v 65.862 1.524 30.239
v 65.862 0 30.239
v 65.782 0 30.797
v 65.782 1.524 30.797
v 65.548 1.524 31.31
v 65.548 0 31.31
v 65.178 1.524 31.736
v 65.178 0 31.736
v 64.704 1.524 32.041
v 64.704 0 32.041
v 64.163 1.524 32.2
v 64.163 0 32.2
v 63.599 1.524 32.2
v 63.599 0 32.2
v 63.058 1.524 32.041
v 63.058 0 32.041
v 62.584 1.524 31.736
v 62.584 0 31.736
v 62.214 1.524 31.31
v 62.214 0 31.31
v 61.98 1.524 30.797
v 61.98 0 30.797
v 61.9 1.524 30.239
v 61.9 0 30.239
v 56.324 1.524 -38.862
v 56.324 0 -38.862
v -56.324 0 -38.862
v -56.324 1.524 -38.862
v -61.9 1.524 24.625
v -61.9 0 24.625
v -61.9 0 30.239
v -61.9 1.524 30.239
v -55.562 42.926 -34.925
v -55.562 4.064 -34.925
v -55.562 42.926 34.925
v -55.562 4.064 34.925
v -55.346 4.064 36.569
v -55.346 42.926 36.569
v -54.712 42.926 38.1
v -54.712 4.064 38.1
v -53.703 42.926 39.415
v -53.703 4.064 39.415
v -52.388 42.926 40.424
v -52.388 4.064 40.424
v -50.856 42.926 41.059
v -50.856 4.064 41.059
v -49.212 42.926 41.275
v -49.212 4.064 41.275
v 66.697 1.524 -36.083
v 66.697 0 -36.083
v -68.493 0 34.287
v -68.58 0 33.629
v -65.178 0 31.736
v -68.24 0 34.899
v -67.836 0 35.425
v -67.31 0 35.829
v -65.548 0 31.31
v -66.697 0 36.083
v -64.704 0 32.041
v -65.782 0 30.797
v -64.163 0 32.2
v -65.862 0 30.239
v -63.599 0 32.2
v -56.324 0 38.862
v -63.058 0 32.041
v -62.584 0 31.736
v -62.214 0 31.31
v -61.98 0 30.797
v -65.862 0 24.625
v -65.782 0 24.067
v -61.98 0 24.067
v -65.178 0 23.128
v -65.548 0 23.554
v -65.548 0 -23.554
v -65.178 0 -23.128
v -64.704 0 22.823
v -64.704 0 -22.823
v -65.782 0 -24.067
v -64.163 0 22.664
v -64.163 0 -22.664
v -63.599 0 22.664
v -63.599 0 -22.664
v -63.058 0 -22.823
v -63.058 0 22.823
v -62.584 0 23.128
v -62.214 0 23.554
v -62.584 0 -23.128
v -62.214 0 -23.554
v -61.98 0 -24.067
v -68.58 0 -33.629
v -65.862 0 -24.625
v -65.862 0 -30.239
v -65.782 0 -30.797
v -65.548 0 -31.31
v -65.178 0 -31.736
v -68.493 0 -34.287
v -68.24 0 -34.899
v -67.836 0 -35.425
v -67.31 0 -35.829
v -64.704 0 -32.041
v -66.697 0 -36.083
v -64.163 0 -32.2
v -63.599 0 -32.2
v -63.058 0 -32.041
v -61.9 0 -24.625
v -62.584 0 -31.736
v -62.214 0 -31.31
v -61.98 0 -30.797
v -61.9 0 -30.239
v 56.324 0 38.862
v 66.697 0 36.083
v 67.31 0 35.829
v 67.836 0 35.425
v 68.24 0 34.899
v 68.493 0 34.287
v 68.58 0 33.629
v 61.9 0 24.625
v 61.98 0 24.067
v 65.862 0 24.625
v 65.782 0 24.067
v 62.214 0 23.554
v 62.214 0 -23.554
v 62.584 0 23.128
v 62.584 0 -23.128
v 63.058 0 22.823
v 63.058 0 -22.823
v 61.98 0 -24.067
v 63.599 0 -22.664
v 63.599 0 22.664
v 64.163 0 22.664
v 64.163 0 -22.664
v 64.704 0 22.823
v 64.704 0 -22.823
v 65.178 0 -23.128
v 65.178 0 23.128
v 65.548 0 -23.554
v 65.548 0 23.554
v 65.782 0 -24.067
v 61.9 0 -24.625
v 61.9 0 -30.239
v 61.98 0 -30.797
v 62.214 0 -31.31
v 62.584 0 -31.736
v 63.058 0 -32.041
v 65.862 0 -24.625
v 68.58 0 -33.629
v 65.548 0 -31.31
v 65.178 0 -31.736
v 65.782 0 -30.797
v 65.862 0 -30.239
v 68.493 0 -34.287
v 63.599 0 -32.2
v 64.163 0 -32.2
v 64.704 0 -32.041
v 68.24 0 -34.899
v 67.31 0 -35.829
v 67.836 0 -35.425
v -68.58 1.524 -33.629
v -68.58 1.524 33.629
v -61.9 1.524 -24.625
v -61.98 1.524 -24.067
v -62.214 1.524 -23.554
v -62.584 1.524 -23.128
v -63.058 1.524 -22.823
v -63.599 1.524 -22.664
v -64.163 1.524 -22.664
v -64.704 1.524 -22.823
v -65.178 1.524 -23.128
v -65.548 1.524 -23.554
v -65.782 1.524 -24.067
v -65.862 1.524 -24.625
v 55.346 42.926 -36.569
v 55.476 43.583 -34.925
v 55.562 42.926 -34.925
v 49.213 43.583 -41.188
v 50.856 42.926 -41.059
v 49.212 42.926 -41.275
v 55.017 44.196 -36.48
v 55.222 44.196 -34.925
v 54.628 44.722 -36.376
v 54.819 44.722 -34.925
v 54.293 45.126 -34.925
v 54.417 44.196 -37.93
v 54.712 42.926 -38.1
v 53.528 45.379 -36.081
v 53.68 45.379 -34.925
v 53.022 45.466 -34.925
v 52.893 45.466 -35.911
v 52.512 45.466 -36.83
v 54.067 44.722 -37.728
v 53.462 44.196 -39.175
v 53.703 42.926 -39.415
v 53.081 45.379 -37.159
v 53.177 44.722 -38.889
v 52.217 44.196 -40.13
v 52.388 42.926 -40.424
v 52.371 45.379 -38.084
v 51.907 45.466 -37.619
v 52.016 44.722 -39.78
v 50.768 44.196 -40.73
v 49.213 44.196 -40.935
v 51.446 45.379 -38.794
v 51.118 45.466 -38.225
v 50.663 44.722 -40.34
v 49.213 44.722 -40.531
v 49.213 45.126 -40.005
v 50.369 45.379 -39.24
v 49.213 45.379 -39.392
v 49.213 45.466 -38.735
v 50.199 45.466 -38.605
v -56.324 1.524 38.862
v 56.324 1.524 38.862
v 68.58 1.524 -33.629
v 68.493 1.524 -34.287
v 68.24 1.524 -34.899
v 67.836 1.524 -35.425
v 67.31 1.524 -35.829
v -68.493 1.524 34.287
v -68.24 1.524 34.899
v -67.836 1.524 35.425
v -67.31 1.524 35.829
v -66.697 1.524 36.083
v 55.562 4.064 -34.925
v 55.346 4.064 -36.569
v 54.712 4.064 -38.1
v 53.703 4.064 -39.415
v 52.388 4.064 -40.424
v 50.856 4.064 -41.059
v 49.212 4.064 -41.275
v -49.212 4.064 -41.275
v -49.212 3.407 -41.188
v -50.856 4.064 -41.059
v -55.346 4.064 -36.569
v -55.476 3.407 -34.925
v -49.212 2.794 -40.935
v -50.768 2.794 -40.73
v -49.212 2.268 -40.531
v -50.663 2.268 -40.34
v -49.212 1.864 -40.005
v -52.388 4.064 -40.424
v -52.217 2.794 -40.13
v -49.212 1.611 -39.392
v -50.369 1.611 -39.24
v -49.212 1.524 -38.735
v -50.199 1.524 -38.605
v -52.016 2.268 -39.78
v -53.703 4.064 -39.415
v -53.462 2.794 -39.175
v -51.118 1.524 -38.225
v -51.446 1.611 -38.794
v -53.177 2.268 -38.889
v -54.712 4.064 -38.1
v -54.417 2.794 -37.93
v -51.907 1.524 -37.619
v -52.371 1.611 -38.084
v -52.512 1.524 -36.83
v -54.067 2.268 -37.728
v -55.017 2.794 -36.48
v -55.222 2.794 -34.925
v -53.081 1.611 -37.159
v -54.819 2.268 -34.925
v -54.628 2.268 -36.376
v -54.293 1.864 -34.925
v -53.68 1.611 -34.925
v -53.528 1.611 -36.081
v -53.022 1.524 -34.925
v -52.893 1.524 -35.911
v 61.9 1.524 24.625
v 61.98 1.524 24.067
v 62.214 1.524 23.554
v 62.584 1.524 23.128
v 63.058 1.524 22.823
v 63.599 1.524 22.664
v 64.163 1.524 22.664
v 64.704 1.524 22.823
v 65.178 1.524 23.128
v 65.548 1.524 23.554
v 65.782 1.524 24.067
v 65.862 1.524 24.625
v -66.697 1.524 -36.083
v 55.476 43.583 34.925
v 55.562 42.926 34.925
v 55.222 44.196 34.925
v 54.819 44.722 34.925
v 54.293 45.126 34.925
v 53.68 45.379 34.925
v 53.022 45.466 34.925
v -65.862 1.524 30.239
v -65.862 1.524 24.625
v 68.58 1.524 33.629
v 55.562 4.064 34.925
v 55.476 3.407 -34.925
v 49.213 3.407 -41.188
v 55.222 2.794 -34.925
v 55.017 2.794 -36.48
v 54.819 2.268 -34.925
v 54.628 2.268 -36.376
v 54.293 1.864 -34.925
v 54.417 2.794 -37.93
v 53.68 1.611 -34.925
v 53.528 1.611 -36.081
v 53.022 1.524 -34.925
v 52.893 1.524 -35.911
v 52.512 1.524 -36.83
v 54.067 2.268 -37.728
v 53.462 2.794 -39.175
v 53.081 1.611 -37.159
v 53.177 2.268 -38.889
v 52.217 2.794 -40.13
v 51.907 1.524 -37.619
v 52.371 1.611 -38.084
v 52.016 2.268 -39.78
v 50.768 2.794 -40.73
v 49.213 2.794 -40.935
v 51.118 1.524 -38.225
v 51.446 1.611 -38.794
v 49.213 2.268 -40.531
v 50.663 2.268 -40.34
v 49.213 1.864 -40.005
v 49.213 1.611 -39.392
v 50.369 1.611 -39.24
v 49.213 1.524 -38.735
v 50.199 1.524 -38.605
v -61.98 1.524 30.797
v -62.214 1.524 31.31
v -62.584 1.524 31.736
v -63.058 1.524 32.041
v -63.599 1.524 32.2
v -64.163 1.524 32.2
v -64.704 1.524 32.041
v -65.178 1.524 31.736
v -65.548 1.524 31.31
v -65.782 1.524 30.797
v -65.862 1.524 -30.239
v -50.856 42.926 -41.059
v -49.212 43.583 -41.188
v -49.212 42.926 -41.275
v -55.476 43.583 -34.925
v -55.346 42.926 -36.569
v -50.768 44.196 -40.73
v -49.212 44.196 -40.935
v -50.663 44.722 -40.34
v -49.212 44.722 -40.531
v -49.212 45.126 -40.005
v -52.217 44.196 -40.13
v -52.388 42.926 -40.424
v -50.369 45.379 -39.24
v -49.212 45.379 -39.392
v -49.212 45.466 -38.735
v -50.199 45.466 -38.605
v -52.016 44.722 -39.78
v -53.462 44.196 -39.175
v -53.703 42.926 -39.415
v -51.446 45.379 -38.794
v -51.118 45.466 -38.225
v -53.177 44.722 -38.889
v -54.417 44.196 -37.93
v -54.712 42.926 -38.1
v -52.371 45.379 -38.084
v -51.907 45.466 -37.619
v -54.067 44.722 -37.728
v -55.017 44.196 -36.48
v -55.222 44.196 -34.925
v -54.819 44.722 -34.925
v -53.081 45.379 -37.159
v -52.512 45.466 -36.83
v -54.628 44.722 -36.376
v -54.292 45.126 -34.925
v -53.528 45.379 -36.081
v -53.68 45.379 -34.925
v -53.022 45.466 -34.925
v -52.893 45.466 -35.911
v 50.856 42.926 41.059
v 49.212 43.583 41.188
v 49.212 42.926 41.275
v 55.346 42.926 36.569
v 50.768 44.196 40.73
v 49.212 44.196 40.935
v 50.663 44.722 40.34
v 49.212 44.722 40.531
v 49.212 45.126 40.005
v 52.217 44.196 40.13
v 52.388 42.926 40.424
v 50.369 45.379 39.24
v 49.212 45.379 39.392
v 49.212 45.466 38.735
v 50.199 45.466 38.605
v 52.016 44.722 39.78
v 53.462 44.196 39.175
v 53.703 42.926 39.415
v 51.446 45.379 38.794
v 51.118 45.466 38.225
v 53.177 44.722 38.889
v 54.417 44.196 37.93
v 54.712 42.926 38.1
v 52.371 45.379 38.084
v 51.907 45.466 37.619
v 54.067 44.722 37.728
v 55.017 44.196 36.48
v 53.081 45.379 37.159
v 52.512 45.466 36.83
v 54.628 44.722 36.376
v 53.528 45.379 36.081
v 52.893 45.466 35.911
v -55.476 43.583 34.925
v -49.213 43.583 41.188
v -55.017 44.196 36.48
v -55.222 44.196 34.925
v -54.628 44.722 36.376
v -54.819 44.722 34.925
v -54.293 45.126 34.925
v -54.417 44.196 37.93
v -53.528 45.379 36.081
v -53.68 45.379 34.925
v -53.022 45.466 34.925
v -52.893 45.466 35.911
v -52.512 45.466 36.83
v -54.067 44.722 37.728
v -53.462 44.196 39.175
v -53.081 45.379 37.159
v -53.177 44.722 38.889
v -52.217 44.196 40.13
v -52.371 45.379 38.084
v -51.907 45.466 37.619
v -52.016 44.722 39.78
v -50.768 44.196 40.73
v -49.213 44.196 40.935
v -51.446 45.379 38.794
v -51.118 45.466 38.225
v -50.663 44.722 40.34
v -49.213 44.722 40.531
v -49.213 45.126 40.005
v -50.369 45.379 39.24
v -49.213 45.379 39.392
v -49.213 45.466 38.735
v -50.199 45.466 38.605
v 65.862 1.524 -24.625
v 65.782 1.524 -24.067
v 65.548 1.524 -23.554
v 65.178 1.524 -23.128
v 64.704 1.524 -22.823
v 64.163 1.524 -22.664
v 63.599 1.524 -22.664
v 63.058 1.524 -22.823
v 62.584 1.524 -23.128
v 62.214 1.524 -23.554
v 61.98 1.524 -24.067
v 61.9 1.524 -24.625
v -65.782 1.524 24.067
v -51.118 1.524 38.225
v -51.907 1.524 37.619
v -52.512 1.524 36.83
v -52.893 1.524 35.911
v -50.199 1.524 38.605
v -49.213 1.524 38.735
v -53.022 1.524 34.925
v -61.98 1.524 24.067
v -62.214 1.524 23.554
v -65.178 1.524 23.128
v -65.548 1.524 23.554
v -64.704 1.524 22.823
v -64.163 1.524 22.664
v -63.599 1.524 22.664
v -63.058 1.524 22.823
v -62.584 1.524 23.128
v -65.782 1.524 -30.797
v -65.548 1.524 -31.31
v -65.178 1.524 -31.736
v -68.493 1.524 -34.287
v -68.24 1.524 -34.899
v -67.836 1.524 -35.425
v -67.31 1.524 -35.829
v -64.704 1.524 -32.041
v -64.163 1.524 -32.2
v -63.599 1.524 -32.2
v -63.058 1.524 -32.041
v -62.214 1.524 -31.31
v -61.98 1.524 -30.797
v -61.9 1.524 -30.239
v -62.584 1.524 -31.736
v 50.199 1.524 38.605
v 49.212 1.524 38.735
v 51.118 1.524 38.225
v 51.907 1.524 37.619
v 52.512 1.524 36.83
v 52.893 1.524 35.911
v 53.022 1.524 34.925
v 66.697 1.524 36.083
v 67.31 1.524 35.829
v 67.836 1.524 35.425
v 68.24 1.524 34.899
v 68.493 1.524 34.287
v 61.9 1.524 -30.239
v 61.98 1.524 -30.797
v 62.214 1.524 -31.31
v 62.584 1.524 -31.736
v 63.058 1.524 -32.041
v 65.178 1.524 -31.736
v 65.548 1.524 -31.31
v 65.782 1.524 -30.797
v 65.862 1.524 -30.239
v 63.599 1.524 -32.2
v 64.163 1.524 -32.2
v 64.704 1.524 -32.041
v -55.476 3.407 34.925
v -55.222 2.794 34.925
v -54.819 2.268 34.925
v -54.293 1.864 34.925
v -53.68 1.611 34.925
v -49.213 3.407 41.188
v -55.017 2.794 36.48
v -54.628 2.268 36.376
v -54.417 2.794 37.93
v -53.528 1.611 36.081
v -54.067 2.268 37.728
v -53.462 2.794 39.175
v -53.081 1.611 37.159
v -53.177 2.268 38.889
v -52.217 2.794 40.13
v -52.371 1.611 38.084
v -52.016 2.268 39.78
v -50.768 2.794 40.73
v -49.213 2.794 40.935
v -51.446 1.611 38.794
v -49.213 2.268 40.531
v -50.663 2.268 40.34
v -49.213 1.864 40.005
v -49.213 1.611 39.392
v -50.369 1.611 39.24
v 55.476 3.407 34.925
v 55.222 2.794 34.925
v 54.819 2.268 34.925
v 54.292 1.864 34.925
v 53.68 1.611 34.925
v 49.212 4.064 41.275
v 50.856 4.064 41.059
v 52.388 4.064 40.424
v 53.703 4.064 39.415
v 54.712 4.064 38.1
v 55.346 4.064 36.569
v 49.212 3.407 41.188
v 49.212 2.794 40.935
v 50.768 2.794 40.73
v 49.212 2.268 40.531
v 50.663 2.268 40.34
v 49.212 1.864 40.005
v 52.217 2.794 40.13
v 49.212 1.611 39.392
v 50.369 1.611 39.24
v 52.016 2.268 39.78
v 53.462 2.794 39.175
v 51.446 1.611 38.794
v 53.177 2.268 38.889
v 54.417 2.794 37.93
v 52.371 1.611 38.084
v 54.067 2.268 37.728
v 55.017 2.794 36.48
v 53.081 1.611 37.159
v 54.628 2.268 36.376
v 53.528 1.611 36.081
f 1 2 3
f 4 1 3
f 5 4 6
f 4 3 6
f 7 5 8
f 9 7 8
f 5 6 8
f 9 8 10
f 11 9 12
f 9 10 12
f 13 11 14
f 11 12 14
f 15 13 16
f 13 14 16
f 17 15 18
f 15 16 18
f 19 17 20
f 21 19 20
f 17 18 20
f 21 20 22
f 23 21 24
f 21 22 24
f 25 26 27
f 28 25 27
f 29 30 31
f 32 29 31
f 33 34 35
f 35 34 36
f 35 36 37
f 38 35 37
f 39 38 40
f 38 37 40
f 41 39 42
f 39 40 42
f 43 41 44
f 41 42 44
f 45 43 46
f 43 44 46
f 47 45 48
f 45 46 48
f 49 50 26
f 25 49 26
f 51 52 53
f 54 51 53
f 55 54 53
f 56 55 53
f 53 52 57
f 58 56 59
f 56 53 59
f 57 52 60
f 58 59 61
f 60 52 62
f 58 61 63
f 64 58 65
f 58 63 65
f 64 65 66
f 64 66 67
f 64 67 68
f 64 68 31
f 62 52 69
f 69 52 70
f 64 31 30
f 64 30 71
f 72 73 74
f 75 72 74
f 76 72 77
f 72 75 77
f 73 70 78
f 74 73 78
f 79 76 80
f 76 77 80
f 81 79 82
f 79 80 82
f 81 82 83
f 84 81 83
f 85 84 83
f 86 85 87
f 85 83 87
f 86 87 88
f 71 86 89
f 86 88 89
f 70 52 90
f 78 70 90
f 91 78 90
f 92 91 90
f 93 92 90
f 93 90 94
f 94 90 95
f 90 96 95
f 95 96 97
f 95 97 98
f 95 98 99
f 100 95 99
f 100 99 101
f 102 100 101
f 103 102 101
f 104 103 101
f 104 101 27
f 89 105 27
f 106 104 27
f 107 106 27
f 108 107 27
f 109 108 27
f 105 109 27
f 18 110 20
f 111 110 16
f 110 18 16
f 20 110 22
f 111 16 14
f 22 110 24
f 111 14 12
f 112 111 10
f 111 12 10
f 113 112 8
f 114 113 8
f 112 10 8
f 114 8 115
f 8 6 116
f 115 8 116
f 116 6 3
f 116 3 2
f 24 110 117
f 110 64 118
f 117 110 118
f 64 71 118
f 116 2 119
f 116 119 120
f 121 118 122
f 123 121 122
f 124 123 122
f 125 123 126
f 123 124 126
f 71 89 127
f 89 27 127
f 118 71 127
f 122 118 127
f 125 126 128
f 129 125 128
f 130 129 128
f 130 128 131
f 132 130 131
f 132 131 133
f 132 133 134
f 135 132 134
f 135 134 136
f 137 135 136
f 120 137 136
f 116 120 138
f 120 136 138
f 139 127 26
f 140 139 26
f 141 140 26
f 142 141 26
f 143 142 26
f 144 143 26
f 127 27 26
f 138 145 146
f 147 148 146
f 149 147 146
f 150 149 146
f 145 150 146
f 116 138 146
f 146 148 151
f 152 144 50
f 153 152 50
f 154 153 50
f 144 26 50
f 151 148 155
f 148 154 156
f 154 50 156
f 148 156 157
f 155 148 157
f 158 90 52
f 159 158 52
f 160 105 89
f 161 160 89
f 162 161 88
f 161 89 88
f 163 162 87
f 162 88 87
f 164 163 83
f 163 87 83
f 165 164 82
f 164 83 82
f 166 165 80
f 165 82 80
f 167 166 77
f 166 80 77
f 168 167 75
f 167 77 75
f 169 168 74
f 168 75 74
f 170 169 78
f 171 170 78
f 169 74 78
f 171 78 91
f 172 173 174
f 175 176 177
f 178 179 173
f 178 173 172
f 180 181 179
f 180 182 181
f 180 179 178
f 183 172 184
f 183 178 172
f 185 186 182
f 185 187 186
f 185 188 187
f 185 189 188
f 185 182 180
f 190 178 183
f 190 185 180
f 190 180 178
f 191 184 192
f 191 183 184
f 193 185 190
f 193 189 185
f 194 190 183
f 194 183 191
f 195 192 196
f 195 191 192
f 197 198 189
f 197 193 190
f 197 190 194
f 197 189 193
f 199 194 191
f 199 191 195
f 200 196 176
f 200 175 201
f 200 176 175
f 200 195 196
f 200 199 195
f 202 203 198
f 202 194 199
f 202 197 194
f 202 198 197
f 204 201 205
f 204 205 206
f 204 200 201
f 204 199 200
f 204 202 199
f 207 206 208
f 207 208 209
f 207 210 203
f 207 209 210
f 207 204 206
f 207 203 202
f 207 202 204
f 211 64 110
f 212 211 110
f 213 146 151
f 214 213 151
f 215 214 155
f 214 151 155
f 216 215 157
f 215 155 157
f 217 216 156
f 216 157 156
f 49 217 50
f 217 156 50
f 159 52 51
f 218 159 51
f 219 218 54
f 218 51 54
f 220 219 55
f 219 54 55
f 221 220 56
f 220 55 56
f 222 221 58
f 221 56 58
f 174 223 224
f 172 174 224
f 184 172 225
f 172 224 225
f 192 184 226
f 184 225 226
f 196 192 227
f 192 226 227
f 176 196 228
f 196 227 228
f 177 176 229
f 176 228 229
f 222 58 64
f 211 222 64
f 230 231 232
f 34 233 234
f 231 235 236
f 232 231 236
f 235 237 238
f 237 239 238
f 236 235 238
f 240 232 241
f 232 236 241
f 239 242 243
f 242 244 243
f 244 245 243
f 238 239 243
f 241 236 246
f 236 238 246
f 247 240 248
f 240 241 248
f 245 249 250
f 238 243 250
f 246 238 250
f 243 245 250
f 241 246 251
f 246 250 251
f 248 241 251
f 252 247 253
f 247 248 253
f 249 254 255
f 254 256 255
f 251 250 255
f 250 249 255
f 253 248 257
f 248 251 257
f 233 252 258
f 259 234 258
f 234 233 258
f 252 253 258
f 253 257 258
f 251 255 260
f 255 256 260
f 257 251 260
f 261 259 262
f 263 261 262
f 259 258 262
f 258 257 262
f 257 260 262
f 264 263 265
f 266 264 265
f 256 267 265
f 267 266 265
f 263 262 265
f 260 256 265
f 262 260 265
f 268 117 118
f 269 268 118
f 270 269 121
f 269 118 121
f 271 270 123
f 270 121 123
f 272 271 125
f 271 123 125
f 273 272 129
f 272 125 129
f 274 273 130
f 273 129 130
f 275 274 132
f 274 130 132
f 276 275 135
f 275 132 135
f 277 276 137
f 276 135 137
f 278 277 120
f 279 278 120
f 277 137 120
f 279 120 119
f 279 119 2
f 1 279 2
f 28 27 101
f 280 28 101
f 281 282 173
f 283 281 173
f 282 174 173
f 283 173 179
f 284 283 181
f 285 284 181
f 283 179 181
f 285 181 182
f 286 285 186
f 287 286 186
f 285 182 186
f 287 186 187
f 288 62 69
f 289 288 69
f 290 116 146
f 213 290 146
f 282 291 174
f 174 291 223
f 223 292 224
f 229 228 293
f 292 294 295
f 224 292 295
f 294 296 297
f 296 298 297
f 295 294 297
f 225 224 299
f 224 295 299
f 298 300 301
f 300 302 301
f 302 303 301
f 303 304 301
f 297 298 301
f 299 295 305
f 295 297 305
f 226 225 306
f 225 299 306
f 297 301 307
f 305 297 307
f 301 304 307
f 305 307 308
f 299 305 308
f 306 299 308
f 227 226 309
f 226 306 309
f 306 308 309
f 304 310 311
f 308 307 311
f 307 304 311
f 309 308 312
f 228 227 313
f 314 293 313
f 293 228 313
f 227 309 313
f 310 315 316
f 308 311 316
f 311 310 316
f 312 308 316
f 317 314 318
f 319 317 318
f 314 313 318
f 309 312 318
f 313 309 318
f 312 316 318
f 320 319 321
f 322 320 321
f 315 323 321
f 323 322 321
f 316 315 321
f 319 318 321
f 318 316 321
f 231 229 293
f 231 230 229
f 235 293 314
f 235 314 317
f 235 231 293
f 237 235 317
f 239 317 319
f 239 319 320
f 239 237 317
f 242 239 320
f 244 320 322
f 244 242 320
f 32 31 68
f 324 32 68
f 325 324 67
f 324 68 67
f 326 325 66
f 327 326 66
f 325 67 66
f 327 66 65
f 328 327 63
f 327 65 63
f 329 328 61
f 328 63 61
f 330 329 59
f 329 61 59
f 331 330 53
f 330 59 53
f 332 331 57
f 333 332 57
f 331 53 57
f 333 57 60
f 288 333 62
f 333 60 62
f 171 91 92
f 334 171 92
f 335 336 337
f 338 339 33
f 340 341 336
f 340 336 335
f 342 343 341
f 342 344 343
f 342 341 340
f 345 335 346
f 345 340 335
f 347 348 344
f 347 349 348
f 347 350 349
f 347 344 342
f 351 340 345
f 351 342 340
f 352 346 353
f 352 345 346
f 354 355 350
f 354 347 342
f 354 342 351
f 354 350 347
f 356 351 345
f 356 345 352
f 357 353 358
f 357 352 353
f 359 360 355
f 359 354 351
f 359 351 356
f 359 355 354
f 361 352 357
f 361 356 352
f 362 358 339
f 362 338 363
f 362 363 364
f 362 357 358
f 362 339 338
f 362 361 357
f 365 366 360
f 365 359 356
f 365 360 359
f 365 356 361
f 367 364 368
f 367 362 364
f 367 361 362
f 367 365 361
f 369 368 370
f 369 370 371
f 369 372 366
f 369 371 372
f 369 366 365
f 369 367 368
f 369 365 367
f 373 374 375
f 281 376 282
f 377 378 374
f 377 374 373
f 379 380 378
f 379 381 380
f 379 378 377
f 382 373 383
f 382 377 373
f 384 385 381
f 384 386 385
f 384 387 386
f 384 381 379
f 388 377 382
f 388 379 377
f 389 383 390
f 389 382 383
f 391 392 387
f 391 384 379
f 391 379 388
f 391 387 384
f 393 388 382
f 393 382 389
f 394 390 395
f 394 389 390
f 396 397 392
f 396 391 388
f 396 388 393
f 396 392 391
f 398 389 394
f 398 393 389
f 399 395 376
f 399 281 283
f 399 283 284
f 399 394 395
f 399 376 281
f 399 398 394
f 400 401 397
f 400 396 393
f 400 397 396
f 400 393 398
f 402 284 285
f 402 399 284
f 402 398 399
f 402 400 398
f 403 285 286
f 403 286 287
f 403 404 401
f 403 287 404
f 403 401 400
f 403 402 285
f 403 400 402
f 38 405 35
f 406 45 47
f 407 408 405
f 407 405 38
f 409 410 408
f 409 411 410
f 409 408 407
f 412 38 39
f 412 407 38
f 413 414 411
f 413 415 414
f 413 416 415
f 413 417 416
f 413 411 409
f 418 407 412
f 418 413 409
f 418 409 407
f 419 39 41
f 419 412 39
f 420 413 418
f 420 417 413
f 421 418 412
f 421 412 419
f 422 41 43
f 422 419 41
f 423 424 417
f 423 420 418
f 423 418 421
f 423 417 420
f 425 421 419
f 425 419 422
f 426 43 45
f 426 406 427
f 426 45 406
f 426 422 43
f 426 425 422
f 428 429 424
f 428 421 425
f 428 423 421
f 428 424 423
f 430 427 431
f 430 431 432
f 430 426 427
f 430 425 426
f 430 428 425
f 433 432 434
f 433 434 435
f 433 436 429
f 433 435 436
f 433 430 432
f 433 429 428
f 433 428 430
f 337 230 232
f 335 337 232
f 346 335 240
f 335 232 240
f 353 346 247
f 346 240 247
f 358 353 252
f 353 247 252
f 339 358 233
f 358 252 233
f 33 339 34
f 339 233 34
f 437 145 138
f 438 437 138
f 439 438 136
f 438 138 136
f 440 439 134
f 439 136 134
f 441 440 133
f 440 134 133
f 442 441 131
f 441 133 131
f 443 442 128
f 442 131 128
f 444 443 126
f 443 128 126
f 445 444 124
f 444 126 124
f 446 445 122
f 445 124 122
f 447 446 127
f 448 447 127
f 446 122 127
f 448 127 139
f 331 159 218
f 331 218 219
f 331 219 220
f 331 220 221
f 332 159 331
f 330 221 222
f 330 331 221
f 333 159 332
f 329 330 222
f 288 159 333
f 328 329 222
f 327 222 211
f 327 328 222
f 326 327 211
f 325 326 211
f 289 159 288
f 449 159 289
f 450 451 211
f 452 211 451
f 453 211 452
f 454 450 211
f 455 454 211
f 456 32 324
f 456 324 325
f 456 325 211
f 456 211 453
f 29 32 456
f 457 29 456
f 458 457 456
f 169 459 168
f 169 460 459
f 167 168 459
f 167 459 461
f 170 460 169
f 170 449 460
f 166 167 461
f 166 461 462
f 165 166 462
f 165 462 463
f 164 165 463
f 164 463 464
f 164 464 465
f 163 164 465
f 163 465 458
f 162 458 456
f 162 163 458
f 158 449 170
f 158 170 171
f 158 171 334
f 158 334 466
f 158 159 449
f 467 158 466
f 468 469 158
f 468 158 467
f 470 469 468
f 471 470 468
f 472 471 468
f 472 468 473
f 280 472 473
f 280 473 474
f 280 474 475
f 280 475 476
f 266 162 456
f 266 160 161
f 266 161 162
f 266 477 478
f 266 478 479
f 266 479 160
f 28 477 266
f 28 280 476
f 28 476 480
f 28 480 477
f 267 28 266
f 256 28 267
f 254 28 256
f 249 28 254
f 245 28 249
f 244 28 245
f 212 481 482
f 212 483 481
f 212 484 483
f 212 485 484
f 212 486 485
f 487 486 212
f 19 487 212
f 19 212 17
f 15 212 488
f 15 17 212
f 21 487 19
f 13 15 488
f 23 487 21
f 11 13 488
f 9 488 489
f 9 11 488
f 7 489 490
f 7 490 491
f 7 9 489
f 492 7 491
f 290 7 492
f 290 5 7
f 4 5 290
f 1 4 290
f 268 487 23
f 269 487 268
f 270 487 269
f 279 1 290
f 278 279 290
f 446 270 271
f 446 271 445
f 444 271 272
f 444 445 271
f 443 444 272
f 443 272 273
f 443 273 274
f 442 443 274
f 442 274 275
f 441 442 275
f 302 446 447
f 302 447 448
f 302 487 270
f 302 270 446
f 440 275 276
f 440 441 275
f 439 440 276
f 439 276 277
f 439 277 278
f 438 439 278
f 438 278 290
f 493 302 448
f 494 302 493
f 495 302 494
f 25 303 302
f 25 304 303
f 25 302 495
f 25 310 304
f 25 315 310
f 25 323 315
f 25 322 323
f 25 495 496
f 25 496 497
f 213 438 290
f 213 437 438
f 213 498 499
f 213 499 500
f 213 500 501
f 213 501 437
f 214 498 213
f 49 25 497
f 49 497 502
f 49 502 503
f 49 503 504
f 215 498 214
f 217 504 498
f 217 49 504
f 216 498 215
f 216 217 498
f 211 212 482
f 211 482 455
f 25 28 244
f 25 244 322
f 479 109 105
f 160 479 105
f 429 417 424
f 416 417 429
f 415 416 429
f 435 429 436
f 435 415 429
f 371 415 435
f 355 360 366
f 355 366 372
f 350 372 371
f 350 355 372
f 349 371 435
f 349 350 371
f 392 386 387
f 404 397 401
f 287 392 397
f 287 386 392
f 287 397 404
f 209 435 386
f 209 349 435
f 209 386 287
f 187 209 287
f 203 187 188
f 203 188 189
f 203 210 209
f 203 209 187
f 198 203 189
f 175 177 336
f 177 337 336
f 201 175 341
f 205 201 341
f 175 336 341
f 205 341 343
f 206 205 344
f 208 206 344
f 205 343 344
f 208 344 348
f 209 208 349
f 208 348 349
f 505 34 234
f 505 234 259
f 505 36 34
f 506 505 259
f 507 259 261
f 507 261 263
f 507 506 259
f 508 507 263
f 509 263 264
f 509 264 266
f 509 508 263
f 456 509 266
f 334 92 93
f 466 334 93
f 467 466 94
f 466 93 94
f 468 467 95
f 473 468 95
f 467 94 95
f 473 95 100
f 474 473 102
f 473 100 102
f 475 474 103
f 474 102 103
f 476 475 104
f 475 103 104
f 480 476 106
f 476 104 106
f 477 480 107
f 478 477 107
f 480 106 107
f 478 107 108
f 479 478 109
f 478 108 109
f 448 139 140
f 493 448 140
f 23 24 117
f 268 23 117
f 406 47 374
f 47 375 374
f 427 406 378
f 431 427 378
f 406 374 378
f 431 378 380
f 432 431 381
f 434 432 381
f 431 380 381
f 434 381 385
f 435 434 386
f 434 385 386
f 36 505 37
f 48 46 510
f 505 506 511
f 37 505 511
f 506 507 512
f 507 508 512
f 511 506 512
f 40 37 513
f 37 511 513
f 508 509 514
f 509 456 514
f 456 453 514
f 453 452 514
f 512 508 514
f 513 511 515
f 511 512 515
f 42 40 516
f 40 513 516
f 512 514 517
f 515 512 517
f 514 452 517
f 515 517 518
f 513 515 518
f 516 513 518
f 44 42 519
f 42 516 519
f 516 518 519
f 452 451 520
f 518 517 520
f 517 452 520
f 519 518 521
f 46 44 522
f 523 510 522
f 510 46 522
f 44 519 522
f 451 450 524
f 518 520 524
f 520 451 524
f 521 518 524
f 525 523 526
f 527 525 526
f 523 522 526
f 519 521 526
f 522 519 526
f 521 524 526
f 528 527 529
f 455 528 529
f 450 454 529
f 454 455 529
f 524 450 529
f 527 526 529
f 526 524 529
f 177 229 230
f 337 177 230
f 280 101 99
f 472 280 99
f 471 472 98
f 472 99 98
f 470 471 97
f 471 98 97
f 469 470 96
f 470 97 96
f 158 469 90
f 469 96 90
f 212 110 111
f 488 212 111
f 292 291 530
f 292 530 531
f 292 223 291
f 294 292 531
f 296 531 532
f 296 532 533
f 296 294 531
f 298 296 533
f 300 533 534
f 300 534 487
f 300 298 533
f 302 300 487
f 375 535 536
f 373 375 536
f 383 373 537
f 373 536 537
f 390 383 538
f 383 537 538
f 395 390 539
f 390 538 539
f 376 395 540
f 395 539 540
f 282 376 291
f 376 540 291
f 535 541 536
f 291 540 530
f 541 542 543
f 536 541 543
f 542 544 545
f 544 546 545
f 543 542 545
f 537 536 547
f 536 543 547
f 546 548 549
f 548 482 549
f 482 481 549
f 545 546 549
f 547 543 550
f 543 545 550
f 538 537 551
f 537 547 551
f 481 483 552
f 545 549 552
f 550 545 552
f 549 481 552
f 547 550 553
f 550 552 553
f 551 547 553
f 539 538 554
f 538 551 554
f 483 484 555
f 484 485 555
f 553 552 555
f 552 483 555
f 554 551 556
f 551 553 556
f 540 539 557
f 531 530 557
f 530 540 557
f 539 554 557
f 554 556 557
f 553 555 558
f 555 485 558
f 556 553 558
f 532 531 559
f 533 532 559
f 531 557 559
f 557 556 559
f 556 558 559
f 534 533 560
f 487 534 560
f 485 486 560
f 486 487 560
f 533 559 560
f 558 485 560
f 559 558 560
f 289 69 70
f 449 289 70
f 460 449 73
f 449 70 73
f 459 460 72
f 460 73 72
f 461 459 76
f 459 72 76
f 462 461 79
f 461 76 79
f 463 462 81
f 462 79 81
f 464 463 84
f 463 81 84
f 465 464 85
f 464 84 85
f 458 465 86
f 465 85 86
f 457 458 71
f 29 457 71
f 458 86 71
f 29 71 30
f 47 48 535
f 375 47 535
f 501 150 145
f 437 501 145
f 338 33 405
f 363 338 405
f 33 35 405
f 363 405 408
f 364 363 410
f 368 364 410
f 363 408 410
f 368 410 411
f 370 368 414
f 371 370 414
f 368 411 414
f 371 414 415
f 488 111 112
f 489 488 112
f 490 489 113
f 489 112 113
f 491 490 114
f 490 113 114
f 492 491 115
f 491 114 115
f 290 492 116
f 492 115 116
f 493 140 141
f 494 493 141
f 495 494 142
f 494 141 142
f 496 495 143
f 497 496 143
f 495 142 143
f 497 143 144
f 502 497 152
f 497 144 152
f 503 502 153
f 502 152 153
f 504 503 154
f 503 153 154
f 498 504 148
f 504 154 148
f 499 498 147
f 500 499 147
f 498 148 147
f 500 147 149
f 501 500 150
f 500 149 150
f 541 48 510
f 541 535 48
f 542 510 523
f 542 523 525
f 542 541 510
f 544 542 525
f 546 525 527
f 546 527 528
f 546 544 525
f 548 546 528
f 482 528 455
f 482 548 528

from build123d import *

# Parameters (mm, degrees)
BOSS_EXTRUDE1_DEPTH = 1.524
BOSS_EXTRUDE2_DEPTH = 43.942
FILLET1_R           = 2.54


with BuildPart() as part:
    # Sketch1 → Boss-Extrude1 (new body)
    with BuildSketch(Plane(origin=(0, 0, 0), x_dir=(1, 0, 0), z_dir=(0, 1, 0))):
        with BuildLine():
            Line((-68.58, 33.629138123), (-68.58, -33.629138123))
            ThreePointArc((-68.58, -33.629138123), (-68.055117484, -35.175392152), (-66.697400375, -36.082589721))
            Line((-66.697400375, -36.082589721), (-56.3245, -38.862))
            Line((-56.3245, -38.862), (0, -38.862))
            Line((0, -38.862), (56.3245, -38.862))
            Line((56.3245, -38.862), (66.697400375, -36.082589721))
            ThreePointArc((66.697400375, -36.082589721), (68.055117484, -35.175392152), (68.58, -33.629138123))
            Line((68.58, -33.629138123), (68.58, 33.629138123))
            ThreePointArc((68.58, 33.629138123), (68.055117484, 35.175392152), (66.697400375, 36.082589721))
            Line((66.697400375, 36.082589721), (56.3245, 38.862))
            Line((56.3245, 38.862), (0, 38.862))
            Line((0, 38.862), (-56.3245, 38.862))
            Line((-56.3245, 38.862), (-66.697400375, 36.082589721))
            ThreePointArc((-66.697400375, 36.082589721), (-68.055117484, 35.175392152), (-68.58, 33.629138123))
        make_face()
        with BuildLine():
            Line((-65.8622, 24.6253), (-65.8622, 30.2387))
            ThreePointArc((-65.8622, 30.2387), (-63.881, 32.2199), (-61.8998, 30.2387))
            Line((-61.8998, 30.2387), (-61.8998, 24.6253))
            ThreePointArc((-61.8998, 24.6253), (-63.881, 22.6441), (-65.8622, 24.6253))
        make_face(mode=Mode.SUBTRACT)
        with BuildLine():
            Line((61.8998, 24.6253), (61.8998, 30.2387))
            ThreePointArc((61.8998, 30.2387), (63.881, 32.2199), (65.8622, 30.2387))
            Line((65.8622, 30.2387), (65.8622, 24.6253))
            ThreePointArc((65.8622, 24.6253), (63.881, 22.6441), (61.8998, 24.6253))
        make_face(mode=Mode.SUBTRACT)
        with BuildLine():
            Line((61.8998, -30.2387), (61.8998, -24.6253))
            ThreePointArc((61.8998, -24.6253), (63.881, -22.6441), (65.8622, -24.6253))
            Line((65.8622, -24.6253), (65.8622, -30.2387))
            ThreePointArc((65.8622, -30.2387), (63.881, -32.2199), (61.8998, -30.2387))
        make_face(mode=Mode.SUBTRACT)
        with BuildLine():
            Line((-65.8622, -30.2387), (-65.8622, -24.6253))
            ThreePointArc((-65.8622, -24.6253), (-63.881, -22.6441), (-61.8998, -24.6253))
            Line((-61.8998, -24.6253), (-61.8998, -30.2387))
            ThreePointArc((-61.8998, -30.2387), (-63.881, -32.2199), (-65.8622, -30.2387))
        make_face(mode=Mode.SUBTRACT)
    extrude(amount=BOSS_EXTRUDE1_DEPTH)


with BuildPart() as body_2:
    # Sketch2 → Boss-Extrude2 (new body)
    with BuildSketch(Plane(origin=(0, 1.524, 0), x_dir=(1, 0, 0), z_dir=(0, 1, 0))):
        with BuildLine():
            Line((55.5625, -34.925), (55.5625, 34.925))
            ThreePointArc((55.5625, 34.925), (53.702628061, 39.415128061), (49.2125, 41.275))
            Line((49.2125, 41.275), (-49.2125, 41.275))
            ThreePointArc((-49.2125, 41.275), (-53.702628061, 39.415128061), (-55.5625, 34.925))
            Line((-55.5625, 34.925), (-55.5625, -34.925))
            ThreePointArc((-55.5625, -34.925), (-53.702628061, -39.415128061), (-49.2125, -41.275))
            Line((-49.2125, -41.275), (49.2125, -41.275))
            ThreePointArc((49.2125, -41.275), (53.702628061, -39.415128061), (55.5625, -34.925))
        make_face()
    extrude(amount=BOSS_EXTRUDE2_DEPTH)

    # Fillet1
    fillet1_edges = [body_2.edges().sort_by_distance(p)[0] for p in [
        (-55.5625, 1.524, 0),
        (-53.702628061, 1.524, -39.415128061),
        (0, 1.524, -41.275),
        (53.702628061, 1.524, -39.415128061),
        (55.5625, 45.466, 0),
        (53.702628061, 45.466, 39.415128061),
        (0, 45.466, 41.275),
        (-53.702628061, 45.466, 39.415128061),
        (-55.5625, 45.466, 0),
        (-53.702628061, 45.466, -39.415128061),
        (0, 45.466, -41.275),
        (53.702628061, 45.466, -39.415128061),
        (55.5625, 1.524, 0),
        (53.702628061, 1.524, 39.415128061),
        (0, 1.524, 41.275),
        (-53.702628061, 1.524, 39.415128061),
    ]]
    fillet(fillet1_edges, radius=FILLET1_R)

    # Combine1: union part
    add(part.part)


solid = body_2.part
